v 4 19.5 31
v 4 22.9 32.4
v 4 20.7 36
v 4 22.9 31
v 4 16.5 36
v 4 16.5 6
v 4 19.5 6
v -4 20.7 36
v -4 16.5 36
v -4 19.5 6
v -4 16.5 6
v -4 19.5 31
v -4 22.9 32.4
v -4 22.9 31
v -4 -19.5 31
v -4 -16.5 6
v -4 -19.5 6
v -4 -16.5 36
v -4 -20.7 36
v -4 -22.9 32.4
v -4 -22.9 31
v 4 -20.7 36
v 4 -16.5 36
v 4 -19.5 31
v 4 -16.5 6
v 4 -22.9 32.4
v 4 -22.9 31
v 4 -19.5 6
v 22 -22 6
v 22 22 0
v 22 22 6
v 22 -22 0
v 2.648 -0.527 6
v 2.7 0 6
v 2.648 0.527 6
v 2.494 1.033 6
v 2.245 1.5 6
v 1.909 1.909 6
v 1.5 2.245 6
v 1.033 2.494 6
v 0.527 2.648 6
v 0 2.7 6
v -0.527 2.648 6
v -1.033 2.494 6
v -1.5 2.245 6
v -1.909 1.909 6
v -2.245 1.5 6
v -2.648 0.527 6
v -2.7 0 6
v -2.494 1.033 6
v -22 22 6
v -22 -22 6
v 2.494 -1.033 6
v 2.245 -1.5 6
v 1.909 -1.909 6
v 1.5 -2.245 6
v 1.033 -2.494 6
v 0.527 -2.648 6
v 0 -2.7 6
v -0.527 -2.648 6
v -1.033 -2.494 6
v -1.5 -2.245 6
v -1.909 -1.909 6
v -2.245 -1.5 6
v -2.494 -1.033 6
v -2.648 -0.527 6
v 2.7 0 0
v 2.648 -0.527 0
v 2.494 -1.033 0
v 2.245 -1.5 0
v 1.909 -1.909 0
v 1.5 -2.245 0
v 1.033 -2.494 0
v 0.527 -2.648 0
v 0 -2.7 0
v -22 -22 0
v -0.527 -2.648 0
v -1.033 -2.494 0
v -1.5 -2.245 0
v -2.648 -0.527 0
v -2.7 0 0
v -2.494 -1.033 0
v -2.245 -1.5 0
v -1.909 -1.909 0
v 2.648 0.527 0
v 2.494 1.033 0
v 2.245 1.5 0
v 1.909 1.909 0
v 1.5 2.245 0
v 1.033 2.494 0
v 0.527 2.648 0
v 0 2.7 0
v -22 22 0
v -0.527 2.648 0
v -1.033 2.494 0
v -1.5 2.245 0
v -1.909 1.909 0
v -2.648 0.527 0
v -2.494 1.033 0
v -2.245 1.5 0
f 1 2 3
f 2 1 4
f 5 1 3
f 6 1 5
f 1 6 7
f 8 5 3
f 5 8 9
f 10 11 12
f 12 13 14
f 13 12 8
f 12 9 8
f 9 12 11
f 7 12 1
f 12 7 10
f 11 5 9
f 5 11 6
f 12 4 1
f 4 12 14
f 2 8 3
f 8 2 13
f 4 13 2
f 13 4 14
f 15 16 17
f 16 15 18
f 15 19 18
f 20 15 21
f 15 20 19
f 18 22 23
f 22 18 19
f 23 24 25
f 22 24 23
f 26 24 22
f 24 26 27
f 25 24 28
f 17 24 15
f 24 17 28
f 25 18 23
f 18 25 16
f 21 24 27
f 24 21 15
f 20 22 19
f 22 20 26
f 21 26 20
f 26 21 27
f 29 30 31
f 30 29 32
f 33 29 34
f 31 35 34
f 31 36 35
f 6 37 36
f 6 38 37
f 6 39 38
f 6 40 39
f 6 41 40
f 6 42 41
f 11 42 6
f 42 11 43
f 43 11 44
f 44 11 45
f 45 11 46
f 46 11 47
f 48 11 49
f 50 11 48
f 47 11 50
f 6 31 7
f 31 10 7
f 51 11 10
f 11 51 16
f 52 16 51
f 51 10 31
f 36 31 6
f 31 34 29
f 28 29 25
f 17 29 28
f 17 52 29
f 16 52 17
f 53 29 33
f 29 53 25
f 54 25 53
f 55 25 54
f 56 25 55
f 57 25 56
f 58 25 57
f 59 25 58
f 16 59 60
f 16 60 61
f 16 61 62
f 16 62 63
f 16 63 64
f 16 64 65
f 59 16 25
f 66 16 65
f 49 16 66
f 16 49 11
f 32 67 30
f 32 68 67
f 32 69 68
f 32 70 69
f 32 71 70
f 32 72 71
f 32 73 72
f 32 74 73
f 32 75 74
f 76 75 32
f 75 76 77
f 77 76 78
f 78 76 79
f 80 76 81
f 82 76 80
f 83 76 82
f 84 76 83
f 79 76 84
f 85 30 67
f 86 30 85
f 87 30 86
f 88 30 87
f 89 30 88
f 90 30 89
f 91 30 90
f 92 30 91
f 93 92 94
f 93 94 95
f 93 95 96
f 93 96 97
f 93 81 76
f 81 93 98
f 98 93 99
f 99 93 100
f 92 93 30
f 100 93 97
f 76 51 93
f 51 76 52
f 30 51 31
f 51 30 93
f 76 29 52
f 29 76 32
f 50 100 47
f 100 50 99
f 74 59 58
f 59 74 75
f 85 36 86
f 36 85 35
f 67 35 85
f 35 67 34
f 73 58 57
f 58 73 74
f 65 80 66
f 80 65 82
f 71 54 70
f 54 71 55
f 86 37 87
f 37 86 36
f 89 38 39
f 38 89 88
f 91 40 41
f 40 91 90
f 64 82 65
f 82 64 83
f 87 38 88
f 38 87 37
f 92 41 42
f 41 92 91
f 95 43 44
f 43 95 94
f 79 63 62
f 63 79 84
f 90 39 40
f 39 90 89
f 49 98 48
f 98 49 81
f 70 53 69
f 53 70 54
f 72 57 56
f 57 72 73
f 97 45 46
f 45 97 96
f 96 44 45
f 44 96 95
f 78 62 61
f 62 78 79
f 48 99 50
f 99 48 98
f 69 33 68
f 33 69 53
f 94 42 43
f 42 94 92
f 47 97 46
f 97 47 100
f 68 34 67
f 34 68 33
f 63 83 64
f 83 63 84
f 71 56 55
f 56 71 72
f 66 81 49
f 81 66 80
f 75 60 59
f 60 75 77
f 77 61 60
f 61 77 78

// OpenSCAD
$fn = 32;

// ----------------------------------------------------------------------
// Snap-fit latch: 2 arms, 30 mm tall, 3.6 mm undercut hooks
// ----------------------------------------------------------------------

// --- parameters (mm) ---
base_d = 44;              // base plate depth
base_h = 6;               // base plate thickness
span = 36;                // distance between opposite arms
arm_t = 3;                // arm thickness
arm_d = 8;                // arm width
height = 30;              // free arm length
head_len = 3.6;           // hook reach
head_h = 5;               // hook height
lead = 1.4;               // lead-in ramp thickness
bore_d = 5.4;             // base fixing bore
top_z = 36;               // height of the arm tips above the base

arms = 2;

difference() {
  union() {
    /* base plate, centred on the arm ring */
    translate([-22, -22, 0]) cube([base_d, base_d, base_h]);
    for (a = [0 : 360 / arms : 359]) rotate([0, 0, a]) {
    /* arm, sunk 0.5 mm into the base */
    translate([-arm_d / 2, span / 2 - arm_t / 2, base_h - 0.5]) cube([arm_d, arm_t, height + 0.5]);
    /* hook: a convex hull of a tall inner block and a thin outer lip
       gives a flat undercut below and a lead-in ramp on top */
    hull() {
      translate([-arm_d / 2, span / 2 + arm_t / 2 - 0.6, top_z - head_h]) cube([arm_d, lead + 0.4, head_h]);
      translate([-arm_d / 2, span / 2 + arm_t / 2 - 0.2, top_z - head_h]) cube([arm_d, head_len, lead]);
    }
    }
  }
  translate([0, 0, -2.5]) cylinder(h = base_h + 5, d = bore_d);
}
